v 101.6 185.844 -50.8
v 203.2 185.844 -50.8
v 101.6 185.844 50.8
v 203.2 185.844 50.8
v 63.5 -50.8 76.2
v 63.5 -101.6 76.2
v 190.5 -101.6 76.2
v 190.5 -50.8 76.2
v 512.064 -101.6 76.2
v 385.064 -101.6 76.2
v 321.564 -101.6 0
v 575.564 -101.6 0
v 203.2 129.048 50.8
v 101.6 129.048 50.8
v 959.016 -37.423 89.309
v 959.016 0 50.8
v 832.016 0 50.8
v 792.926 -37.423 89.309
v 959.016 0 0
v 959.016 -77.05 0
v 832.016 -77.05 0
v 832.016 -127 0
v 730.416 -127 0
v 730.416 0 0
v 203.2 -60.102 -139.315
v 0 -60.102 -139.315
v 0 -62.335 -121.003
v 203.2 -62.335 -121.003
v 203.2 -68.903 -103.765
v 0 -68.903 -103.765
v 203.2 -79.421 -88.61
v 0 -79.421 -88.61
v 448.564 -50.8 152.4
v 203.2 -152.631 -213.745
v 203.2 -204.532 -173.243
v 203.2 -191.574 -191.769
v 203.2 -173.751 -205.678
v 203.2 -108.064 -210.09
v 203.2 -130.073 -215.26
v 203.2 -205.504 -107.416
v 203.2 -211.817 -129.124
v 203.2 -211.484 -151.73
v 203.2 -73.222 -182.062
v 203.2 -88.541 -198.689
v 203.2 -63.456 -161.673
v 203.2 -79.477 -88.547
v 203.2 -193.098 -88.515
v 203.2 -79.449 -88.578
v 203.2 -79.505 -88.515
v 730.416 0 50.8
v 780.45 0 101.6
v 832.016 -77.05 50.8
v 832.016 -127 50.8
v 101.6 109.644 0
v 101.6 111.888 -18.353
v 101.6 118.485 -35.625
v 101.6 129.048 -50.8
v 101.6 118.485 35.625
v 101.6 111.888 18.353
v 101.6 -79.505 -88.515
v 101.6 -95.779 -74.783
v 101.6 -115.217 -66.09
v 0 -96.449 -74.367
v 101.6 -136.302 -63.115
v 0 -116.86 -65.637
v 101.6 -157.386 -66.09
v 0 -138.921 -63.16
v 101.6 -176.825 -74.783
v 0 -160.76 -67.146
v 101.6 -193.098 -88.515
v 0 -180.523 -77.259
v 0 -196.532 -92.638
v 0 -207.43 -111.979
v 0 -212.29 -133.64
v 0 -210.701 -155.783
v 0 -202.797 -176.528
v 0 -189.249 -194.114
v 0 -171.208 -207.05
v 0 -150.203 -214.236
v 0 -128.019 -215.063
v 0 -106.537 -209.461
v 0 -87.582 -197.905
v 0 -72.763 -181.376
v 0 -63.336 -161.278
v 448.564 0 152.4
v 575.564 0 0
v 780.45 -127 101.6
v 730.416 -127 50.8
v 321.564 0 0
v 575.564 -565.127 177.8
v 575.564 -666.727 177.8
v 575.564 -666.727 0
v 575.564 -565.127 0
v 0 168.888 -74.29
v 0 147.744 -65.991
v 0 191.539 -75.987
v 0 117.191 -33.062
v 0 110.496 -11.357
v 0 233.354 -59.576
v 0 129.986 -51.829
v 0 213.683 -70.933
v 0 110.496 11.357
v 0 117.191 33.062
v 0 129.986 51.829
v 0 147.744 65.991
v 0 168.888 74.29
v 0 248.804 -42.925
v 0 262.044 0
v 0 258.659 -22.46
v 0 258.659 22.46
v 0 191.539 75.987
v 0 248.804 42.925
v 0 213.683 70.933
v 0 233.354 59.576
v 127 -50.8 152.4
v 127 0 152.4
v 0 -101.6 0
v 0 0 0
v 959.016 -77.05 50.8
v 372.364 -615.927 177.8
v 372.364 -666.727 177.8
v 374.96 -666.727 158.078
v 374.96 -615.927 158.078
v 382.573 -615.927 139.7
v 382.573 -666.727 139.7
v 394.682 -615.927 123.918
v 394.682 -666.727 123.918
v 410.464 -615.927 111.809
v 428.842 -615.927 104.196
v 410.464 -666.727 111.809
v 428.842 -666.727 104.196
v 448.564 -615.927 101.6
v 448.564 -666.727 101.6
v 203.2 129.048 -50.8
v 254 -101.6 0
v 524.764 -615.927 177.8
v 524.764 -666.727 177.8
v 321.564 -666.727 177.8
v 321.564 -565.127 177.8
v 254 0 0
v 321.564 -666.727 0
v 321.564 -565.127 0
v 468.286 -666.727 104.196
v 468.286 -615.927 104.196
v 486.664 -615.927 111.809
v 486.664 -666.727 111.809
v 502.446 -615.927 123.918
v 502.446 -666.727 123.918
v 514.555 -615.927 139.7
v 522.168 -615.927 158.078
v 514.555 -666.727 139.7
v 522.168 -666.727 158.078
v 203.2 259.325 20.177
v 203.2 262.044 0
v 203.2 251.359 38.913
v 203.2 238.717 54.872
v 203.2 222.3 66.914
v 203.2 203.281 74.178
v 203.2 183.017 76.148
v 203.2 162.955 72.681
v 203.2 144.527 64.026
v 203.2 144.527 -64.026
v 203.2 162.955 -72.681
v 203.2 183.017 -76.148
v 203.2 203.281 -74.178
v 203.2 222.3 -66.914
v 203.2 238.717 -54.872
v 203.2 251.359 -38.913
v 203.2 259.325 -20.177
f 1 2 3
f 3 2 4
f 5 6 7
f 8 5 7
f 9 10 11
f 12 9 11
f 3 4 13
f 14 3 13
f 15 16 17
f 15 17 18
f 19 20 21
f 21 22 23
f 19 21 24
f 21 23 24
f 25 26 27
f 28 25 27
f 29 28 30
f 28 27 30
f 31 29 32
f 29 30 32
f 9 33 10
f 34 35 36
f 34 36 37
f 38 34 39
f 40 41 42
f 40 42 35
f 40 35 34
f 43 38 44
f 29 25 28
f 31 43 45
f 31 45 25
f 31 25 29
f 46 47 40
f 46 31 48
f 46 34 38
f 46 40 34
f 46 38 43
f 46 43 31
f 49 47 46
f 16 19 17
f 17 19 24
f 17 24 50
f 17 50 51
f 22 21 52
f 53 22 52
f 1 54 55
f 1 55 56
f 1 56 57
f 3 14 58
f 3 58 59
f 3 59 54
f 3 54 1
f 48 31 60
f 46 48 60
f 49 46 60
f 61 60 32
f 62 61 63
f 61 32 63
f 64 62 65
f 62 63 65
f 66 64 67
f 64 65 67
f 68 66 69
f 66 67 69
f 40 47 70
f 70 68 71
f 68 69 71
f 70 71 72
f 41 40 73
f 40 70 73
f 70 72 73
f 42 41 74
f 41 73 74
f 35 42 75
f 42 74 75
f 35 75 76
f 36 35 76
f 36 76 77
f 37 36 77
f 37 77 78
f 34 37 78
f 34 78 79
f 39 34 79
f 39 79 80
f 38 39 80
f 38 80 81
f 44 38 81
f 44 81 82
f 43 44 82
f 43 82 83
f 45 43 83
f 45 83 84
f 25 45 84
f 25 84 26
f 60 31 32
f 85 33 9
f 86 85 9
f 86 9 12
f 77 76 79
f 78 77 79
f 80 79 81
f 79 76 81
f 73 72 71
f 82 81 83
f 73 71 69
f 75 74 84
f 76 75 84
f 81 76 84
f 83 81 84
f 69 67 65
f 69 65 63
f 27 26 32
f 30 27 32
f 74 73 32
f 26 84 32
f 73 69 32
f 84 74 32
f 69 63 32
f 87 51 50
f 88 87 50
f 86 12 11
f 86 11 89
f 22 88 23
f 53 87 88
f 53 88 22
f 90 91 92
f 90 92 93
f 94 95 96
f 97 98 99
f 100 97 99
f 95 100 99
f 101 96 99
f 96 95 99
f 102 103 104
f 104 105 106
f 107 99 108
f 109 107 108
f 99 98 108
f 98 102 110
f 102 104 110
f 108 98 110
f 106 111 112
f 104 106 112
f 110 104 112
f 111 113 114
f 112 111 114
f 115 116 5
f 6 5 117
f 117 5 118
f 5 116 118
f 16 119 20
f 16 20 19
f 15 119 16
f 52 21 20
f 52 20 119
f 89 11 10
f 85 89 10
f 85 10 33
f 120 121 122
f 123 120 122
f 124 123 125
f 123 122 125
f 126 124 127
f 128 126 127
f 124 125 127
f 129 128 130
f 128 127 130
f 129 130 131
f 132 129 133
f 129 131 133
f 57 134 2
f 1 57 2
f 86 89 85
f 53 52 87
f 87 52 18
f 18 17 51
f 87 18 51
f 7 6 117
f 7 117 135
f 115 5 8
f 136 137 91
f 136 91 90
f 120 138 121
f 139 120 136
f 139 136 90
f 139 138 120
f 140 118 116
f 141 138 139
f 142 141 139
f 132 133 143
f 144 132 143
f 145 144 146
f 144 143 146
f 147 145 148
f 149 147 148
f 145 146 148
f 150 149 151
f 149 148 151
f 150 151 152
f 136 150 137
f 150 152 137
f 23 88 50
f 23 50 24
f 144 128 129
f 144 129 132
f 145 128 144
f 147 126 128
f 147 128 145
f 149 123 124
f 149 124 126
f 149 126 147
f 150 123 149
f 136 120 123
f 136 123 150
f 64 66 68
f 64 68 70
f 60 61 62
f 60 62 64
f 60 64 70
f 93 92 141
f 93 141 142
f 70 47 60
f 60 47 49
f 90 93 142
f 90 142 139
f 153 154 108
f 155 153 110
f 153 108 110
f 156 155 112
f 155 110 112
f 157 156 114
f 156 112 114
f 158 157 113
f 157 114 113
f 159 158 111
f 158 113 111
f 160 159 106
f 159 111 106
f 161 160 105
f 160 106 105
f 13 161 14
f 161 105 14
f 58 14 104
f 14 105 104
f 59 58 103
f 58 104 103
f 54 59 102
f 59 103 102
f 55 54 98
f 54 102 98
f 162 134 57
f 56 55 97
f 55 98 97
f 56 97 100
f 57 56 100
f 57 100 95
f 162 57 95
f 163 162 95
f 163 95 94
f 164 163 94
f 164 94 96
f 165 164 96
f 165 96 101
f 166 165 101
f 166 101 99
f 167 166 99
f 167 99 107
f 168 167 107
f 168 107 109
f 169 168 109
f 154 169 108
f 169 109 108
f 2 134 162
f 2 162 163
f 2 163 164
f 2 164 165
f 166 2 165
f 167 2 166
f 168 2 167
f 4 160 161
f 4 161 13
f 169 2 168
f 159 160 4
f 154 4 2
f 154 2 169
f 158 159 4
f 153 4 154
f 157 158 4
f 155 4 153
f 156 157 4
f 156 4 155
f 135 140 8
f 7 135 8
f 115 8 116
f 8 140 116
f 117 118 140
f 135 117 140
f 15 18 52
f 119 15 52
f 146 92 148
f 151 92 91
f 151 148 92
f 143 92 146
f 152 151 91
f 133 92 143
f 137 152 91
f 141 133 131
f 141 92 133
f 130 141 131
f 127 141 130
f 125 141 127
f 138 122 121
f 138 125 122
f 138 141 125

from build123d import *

# Parameters (mm, degrees)
F1_DEPTH  = 101.6
F3_DEPTH  = 50.8
F5_DEPTH  = 50.8
F8_DEPTH  = 254
F10_DEPTH = 101.6
F12_DEPTH = 127
F13_W     = 77.0500511372
F13_H     = 50.8
F14_DEPTH = 127
F17_DEPTH = 203.2
F20_DEPTH = 101.6
F22_DEPTH = 203.2
F24_DEPTH = 101.6
F25_W     = 101.6
F25_H     = 177.8
F26_DEPTH = 254
F28_DEPTH = 50.8


# Not quite as in the source:
# - a feature of the source that left no trace in its solid (it failed there, or was rolled back) is left out


with BuildPart() as f1:
    # F0 (on Front) → F1 (new body)
    with BuildSketch(Plane.XZ):
        Polygon((63.5, 76.2), (0, 0), (254, 0), (190.5, 76.2), align=None)
        Polygon((127, 152.4), (63.5, 76.2), (190.5, 76.2), align=None)
    extrude(amount=F1_DEPTH)

    # F2 (on face) → F3 (join)
    with BuildSketch(Plane.XZ.offset(101.6)):
        Polygon((127, 152.4), (63.5, 76.2), (190.5, 76.2), align=None)
    extrude(amount=-F3_DEPTH)

    # F4 (on face) → F5 (cut)
    with BuildSketch(Plane.XZ.offset(101.6)):
        Polygon((127, 152.4), (63.5, 76.2), (190.5, 76.2), align=None)
    extrude(amount=-F5_DEPTH, mode=Mode.SUBTRACT)


with BuildPart() as f8:
    # F7 (on offset) → F8 (new body)
    with BuildSketch(Plane.YZ.offset(321.564)):
        Polygon((-101.6, 0), (0, 0), (0, 152.4), (-50.8, 152.4), (-101.6, 76.2), align=None)
    extrude(amount=F8_DEPTH)

    # F9 (on face) → F10 (cut)
    with BuildSketch(Plane.XZ.offset(101.6)):
        Polygon((321.564, 76.2), (385.064, 76.2), (448.564, 152.4), (321.564, 152.4), align=None)
        Polygon((321.564, 76.2), (321.564, 0), (385.064, 76.2), align=None)
        Polygon((512.064, 76.2), (575.564, 0), (575.564, 76.2), align=None)
        Polygon((448.564, 152.4), (512.064, 76.2), (575.564, 76.2), (575.564, 152.4), align=None)
    extrude(amount=-F10_DEPTH, mode=Mode.SUBTRACT)


with BuildPart() as f12:
    # F11 (on Front) → F12 (new body)
    with BuildSketch(Plane.XZ):
        Polygon((730.4162154386, 50.8), (730.4162154386, 0), (781.2162154386, 0), (780.4500848747, 101.6), align=None)
        Polygon((780.4500848747, 101.6), (781.2162154386, 0), (832.0162154386, 0), (832.0162154386, 50.8), align=None)
    extrude(amount=F12_DEPTH)

    # F13 (on face) → F14 (join)
    with BuildSketch(Plane.YZ.offset(832.0162154386)):
        Polygon((-77.0500511372, 50.8), (0, 50.8), (-37.422735244, 89.3092527986), align=None)
        with Locations((-38.5250255686, 25.4)):
            Rectangle(F13_W, F13_H)
    extrude(amount=F14_DEPTH)

    # F13 (on face) → F15 (join, up to the next surface of F12)
    with BuildSketch(Plane.YZ.offset(832.0162154386)):
        Polygon((-77.0500511372, 50.8), (0, 50.8), (-37.422735244, 89.3092527986), align=None)
    extrude(until=Until.NEXT, dir=(-1, 0, 0))


with BuildPart() as f17:
    # F16 (on Right) → F17 (new body)
    with BuildSketch(Plane.YZ):
        with BuildLine():
            ThreePointArc((-136.3018900156, -215.5146067858), (-82.4203532892, -193.1961435122), (-60.1018900156, -139.3146067858))
            ThreePointArc((-60.1018900156, -139.3146067858), (-65.0951570451, -112.1845279125), (-79.4205561487, -88.6100324604))
            Line((-79.4205561487, -88.6100324604), (-140.1142077817, -88.6100324604))
            Line((-140.1142077817, -88.6100324604), (-193.1832238825, -88.6100324604))
            ThreePointArc((-193.1832238825, -88.6100324604), (-205.8365165106, -170.4815077899), (-136.3018900156, -215.5146067858))
        make_face()
        with BuildLine():
            Line((-140.1142077817, -88.6100324604), (-79.4205561487, -88.6100324604))
            ThreePointArc((-79.4205561487, -88.6100324604), (-136.3018900156, -63.1146067858), (-193.1832238825, -88.6100324604))
            Line((-193.1832238825, -88.6100324604), (-140.1142077817, -88.6100324604))
        make_face()
    extrude(amount=F17_DEPTH)

    # F18 (on face) → F20 (cut)
    with BuildSketch(Plane.YZ.offset(203.2)):
        with BuildLine():
            Line((-193.0983693738, -88.5150011523), (-136.5470457015, -88.5150011523))
            Line((-136.5470457015, -88.5150011523), (-79.5054106574, -88.5150011523))
            ThreePointArc((-79.5054106574, -88.5150011523), (-136.3018900156, -63.1146067858), (-193.0983693738, -88.5150011523))
        make_face()
    extrude(amount=-F20_DEPTH, mode=Mode.SUBTRACT)


with BuildPart() as f22:
    # F21 (on Right) → F22 (new body)
    with BuildSketch(Plane.YZ):
        with BuildLine():
            ThreePointArc((185.844445633, 76.2), (131.9629089065, -53.8815367264), (262.044445633, 0))
            ThreePointArc((262.044445633, 0), (239.7259823594, 53.8815367264), (185.844445633, 76.2))
        make_face()
    extrude(amount=F22_DEPTH)

    # F23 (on face) → F24 (cut)
    with BuildSketch(Plane.YZ.offset(203.2)):
        with BuildLine():
            ThreePointArc((129.0483190045, 50.8), (114.66051188, 27.1898432407), (109.644445633, 0))
            Line((109.644445633, 0), (185.844445633, 0))
            Line((185.844445633, 0), (185.844445633, 50.8))
            Line((185.844445633, 50.8), (129.0483190045, 50.8))
        make_face()
        with BuildLine():
            Line((185.844445633, 0), (109.644445633, 0))
            ThreePointArc((109.644445633, 0), (114.66051188, -27.1898432407), (129.0483190045, -50.8))
            Line((129.0483190045, -50.8), (185.844445633, -50.8))
            Line((185.844445633, -50.8), (185.844445633, 0))
        make_face()
    extrude(amount=-F24_DEPTH, mode=Mode.SUBTRACT)


with BuildPart() as f26:
    # F25 (on offset) → F26 (new body)
    with BuildSketch(Plane.YZ.offset(321.564)):
        with Locations((-615.9271565277, 88.9)):
            Rectangle(F25_W, F25_H)
    extrude(amount=F26_DEPTH)

    # F27 (on face) → F28 (cut)
    with BuildSketch(Plane.XZ.offset(666.7271565277)):
        with BuildLine():
            Line((448.564, 177.8), (448.564, 101.6))
            ThreePointArc((448.564, 101.6), (502.4455367264, 123.9184632736), (524.764, 177.8))
            Line((524.764, 177.8), (448.564, 177.8))
        make_face()
        with BuildLine():
            Line((448.564, 177.8), (372.364, 177.8))
            ThreePointArc((372.364, 177.8), (394.6824632736, 123.9184632736), (448.564, 101.6))
            Line((448.564, 101.6), (448.564, 177.8))
        make_face()
    extrude(amount=-F28_DEPTH, mode=Mode.SUBTRACT)


solid = Compound([f1.part, f8.part, f12.part, f17.part, f22.part, f26.part])
